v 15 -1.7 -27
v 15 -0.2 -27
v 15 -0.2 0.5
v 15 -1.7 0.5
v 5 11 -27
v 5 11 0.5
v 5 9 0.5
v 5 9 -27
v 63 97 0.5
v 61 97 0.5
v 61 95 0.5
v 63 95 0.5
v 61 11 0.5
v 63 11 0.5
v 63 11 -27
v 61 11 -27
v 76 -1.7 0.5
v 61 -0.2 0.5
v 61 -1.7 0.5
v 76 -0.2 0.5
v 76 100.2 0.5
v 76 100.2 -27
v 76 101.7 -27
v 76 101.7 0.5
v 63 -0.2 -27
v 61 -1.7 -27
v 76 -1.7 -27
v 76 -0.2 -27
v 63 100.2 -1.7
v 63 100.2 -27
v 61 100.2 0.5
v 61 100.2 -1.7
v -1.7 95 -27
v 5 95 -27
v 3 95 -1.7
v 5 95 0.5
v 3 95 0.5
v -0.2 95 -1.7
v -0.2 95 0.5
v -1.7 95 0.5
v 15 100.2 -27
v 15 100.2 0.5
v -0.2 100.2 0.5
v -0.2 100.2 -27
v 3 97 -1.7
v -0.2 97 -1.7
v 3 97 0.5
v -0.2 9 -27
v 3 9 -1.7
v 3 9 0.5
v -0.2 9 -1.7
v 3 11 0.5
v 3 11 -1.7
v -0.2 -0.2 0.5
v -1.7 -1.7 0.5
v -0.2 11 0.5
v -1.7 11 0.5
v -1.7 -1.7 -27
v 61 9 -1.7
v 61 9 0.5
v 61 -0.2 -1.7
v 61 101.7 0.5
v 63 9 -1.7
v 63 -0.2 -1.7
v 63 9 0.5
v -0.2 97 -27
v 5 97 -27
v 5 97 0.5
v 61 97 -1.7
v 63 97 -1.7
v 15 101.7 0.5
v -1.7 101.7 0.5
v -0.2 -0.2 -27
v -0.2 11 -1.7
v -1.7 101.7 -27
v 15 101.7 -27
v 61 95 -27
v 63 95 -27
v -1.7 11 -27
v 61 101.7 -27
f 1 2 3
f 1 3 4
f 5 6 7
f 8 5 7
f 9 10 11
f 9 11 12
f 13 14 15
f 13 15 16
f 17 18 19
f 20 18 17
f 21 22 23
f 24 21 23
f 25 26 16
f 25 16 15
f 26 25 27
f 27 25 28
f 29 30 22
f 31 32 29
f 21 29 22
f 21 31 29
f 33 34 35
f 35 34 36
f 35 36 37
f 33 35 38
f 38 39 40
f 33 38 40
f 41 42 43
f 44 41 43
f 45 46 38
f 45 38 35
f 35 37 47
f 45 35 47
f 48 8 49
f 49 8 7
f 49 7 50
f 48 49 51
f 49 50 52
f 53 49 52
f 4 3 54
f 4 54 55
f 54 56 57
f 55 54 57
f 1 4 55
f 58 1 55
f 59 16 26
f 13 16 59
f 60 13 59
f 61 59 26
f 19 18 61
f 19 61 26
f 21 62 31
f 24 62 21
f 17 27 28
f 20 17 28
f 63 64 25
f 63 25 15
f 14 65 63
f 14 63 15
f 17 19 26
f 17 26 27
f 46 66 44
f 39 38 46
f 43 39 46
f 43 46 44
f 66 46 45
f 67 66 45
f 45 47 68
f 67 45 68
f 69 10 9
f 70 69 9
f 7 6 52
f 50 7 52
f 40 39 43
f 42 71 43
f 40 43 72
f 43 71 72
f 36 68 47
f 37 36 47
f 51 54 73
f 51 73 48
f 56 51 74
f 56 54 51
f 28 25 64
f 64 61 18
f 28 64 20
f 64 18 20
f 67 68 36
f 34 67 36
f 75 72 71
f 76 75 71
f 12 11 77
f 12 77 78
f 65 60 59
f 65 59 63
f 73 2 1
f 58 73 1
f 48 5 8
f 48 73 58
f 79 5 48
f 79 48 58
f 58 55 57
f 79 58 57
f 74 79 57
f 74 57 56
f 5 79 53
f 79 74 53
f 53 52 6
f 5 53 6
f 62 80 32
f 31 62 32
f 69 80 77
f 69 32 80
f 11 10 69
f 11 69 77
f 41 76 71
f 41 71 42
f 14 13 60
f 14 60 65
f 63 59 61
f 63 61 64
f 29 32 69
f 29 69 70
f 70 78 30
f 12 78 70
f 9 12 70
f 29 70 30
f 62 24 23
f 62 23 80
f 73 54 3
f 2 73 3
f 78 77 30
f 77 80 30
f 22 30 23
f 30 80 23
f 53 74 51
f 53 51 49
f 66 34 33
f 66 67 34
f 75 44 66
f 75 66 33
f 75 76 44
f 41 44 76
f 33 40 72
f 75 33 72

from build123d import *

# Parameters (mm, degrees)
SKETCH070_W      = 3.2
SKETCH070_H      = 4
SKETCH070_W_2    = 4
SKETCH070_H_2    = 3.2
SKETCH070_H_3    = 9.2
EXTRUDE060_DEPTH = 2.7
EXTRUDE059_DEPTH = 27.5


with BuildPart() as extrude060:
    # Sketch070 → Extrude060 (new body)
    with BuildSketch(Plane.XY.offset(1)):
        with Locations((1.4, 96)):
            Rectangle(SKETCH070_W, SKETCH070_H)
        with Locations((62, 98.6)):
            Rectangle(SKETCH070_W_2, SKETCH070_H_2)
        with Locations((1.4, 10)):
            Rectangle(SKETCH070_W, SKETCH070_H)
        with Locations((62, 4.4)):
            Rectangle(SKETCH070_W_2, SKETCH070_H_3)
    extrude(amount=-EXTRUDE060_DEPTH)


with BuildPart() as jetson_align:
    # Sketch069 → Extrude059 (new body)
    with BuildSketch(Plane.XY.offset(0.5)):
        Polygon((5, 95), (-1.7, 95), (-1.7, 101.7), (15, 101.7), (15, 100.2), (-0.2, 100.2), (-0.2, 97), (5, 97), align=None)
        Polygon((5, 11), (5, 9), (-0.2, 9), (-0.2, -0.2), (15, -0.2), (15, -1.7), (-1.7, -1.7), (-1.7, 11), align=None)
        Polygon((61, 95), (63, 95), (63, 100.2), (76, 100.2), (76, 101.7), (61, 101.7), align=None)
        Polygon((61, 11), (61, -1.7), (76, -1.7), (76, -0.2), (63, -0.2), (63, 11), align=None)
    extrude(amount=-EXTRUDE059_DEPTH)

    # Cut: cut Extrude060
    add(extrude060.part, mode=Mode.SUBTRACT)


solid = jetson_align.part
